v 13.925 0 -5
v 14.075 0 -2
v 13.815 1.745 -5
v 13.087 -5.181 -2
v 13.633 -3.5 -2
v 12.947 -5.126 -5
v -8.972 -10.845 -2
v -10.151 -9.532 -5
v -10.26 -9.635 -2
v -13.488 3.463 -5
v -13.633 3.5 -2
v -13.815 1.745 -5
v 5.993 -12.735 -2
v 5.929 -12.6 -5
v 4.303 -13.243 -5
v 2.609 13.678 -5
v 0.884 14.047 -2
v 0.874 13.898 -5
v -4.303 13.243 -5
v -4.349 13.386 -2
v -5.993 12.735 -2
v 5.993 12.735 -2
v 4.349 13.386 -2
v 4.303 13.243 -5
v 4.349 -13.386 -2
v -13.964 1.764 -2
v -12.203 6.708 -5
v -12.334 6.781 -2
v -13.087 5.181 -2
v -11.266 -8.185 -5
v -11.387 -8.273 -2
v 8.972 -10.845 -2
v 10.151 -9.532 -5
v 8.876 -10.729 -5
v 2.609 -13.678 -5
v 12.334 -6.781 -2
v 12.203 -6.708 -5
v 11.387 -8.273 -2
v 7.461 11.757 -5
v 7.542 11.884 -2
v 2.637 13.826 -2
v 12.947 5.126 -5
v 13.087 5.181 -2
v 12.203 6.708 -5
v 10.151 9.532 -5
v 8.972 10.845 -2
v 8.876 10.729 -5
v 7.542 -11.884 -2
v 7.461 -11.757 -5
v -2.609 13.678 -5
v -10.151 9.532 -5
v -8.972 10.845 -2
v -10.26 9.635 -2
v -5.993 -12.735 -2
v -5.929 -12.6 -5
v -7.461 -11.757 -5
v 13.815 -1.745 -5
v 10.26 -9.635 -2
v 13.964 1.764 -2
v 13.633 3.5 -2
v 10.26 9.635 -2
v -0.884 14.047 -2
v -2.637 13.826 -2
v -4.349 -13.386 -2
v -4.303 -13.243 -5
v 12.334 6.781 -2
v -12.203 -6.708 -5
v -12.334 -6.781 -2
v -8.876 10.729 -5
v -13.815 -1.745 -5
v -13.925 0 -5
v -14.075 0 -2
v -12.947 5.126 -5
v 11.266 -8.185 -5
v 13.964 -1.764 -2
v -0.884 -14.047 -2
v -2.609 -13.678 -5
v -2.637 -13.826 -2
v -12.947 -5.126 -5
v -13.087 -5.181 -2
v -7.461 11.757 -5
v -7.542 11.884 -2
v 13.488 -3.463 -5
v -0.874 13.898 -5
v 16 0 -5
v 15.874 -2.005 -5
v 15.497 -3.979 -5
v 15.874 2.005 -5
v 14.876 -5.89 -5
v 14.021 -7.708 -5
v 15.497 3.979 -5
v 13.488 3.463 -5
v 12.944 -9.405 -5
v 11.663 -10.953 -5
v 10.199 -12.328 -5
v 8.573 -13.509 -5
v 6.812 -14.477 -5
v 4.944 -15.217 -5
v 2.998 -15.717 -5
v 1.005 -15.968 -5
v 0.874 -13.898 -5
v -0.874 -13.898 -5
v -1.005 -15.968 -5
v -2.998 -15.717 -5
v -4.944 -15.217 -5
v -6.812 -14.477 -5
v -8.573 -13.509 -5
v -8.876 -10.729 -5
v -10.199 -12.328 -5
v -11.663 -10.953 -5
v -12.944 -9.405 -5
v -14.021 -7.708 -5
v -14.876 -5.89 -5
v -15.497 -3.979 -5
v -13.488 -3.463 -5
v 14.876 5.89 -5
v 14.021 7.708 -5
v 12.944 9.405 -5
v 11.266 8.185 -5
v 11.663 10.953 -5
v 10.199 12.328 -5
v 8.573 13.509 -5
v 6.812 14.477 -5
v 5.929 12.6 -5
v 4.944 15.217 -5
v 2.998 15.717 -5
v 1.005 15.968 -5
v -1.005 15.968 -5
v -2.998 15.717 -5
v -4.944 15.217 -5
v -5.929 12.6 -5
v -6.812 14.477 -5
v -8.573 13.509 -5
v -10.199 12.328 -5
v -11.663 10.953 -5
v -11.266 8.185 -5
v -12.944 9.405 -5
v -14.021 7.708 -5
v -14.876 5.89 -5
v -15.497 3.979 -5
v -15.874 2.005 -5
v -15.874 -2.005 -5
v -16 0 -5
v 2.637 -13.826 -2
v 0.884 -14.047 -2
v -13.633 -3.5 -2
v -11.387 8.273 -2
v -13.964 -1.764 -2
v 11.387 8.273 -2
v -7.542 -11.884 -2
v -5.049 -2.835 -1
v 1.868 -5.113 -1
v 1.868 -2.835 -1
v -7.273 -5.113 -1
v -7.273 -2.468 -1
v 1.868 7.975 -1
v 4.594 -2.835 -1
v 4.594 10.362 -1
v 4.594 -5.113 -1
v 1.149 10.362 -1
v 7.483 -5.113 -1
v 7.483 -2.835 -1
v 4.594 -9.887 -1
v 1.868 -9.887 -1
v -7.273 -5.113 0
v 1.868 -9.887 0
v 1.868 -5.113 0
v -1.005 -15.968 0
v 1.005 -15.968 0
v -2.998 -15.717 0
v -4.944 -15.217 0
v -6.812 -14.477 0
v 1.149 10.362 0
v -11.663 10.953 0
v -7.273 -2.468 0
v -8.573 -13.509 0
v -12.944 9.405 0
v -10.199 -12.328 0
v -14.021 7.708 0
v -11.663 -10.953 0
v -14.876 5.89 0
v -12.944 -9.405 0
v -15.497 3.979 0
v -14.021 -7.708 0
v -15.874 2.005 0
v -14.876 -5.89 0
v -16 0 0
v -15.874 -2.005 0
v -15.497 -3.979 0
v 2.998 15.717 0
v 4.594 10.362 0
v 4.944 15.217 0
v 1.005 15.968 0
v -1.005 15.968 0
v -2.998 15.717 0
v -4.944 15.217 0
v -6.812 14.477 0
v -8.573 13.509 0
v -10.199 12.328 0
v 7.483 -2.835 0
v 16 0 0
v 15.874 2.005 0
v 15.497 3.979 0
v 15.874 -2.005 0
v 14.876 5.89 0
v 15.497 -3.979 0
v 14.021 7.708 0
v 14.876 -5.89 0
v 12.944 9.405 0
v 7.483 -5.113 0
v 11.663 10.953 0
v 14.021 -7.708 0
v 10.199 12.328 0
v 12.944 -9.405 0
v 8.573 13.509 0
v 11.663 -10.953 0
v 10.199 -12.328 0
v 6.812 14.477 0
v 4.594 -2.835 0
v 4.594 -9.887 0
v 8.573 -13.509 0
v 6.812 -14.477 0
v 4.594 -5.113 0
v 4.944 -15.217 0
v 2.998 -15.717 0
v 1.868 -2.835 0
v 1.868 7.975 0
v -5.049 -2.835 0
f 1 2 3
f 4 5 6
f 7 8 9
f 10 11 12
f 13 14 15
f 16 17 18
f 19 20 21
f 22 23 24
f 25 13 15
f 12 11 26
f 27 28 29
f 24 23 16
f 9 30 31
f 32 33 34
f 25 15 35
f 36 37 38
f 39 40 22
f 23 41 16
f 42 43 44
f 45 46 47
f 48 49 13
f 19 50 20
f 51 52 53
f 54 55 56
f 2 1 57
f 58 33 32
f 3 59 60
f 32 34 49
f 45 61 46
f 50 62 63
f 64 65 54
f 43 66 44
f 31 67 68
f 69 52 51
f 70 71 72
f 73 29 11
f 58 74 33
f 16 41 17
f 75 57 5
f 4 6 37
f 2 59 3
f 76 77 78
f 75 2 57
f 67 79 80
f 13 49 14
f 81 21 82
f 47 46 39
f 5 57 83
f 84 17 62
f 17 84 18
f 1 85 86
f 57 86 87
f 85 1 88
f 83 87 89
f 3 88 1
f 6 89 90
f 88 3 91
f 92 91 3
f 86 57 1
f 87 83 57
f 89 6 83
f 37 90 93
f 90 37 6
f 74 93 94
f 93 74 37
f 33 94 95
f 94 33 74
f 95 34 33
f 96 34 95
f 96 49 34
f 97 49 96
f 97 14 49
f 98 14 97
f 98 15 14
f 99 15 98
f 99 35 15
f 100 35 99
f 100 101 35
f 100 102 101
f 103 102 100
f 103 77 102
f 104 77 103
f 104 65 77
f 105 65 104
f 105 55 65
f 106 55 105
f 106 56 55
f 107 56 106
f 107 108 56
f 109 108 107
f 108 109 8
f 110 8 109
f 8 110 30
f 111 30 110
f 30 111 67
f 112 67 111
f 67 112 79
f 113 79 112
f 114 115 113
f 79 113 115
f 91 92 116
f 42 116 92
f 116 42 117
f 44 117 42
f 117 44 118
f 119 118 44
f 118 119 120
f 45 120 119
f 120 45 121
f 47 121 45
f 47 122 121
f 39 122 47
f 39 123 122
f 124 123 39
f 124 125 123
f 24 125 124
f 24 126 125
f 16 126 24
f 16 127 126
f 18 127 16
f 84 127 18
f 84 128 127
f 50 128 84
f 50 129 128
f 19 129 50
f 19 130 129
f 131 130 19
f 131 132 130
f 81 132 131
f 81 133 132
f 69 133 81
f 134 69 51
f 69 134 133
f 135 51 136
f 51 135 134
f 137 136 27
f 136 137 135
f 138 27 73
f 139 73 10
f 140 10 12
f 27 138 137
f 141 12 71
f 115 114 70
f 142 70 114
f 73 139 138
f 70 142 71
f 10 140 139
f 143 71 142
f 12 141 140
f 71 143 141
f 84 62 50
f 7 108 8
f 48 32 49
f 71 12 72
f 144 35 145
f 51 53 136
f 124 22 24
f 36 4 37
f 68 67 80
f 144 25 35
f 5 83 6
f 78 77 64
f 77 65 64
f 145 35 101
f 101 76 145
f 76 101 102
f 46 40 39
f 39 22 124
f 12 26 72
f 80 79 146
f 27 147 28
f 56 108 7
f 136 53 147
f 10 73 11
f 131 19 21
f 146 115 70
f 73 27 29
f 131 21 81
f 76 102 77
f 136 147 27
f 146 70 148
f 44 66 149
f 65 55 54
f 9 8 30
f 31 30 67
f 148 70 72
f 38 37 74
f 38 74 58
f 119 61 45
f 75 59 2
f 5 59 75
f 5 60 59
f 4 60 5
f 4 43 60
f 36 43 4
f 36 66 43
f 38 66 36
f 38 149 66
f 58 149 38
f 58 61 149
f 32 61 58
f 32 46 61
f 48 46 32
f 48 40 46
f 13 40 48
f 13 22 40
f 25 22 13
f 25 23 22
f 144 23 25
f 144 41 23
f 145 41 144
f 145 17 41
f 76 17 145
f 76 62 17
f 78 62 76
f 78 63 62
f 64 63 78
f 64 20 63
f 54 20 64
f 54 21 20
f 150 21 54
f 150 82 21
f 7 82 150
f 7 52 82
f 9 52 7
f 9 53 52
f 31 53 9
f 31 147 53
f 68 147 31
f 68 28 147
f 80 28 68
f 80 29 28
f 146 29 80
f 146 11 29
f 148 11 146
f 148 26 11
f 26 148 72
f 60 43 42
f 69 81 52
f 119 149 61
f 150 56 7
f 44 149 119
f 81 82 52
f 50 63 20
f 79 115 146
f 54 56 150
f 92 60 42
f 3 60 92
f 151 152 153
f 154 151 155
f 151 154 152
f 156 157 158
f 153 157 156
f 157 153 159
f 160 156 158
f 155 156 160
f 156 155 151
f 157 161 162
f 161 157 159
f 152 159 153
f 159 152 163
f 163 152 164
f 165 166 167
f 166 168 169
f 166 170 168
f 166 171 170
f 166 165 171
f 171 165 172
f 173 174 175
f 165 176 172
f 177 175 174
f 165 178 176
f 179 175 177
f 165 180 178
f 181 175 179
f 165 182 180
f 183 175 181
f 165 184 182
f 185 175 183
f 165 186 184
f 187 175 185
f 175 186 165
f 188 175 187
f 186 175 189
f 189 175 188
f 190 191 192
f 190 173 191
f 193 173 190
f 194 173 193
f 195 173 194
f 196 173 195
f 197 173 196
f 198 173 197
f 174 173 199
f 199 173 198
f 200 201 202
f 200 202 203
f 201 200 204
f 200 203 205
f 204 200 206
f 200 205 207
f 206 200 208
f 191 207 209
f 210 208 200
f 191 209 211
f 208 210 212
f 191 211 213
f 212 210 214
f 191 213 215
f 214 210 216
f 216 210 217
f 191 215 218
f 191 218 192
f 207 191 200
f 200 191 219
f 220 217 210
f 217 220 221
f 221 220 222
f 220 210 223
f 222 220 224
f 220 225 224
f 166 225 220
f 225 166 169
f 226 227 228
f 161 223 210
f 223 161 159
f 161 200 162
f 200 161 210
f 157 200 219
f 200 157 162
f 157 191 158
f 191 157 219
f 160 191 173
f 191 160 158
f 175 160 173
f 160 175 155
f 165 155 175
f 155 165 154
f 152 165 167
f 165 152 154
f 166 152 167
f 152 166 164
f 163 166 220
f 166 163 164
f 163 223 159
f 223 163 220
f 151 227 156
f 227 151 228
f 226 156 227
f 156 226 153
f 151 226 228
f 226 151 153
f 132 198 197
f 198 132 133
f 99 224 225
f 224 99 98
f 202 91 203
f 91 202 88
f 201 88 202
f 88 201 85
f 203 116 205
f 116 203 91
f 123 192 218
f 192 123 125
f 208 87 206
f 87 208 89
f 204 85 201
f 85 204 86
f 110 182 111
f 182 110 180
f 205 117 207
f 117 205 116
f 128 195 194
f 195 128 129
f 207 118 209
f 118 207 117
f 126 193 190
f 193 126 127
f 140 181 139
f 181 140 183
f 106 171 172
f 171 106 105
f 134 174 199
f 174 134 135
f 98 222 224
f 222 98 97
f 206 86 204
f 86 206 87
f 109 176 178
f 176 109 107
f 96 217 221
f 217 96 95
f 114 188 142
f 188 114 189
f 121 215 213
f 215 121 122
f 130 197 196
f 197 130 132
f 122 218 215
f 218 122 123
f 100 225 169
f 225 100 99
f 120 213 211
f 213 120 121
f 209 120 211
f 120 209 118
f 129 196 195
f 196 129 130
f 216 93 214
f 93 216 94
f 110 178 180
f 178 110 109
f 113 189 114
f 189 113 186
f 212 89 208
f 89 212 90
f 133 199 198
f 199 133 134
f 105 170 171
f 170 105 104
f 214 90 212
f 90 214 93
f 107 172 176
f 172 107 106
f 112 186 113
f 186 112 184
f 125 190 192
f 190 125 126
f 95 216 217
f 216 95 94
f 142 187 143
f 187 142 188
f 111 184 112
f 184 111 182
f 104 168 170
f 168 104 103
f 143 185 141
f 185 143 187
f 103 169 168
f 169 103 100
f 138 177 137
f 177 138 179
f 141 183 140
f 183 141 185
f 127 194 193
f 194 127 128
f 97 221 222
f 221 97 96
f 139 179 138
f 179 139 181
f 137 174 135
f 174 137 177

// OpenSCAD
$fn = 50;


difference() {
	union() {
		translate(v = [0, 0, -5.0000000000]) {
			cylinder(h = 5, r = 16.0000000000);
		}
	}
	union() {
		#translate(v = [0, 0, -5.0000000000]) {
			cylinder(h = 3, r1 = 13.9250000000, r2 = 14.0750000000);
		}
		translate(v = [0, 0, -1]) {
			linear_extrude(height = 1) {
				text(font = "Impact", halign = "center", size = 20, text = "4", valign = "center");
			}
		}
	}
}
